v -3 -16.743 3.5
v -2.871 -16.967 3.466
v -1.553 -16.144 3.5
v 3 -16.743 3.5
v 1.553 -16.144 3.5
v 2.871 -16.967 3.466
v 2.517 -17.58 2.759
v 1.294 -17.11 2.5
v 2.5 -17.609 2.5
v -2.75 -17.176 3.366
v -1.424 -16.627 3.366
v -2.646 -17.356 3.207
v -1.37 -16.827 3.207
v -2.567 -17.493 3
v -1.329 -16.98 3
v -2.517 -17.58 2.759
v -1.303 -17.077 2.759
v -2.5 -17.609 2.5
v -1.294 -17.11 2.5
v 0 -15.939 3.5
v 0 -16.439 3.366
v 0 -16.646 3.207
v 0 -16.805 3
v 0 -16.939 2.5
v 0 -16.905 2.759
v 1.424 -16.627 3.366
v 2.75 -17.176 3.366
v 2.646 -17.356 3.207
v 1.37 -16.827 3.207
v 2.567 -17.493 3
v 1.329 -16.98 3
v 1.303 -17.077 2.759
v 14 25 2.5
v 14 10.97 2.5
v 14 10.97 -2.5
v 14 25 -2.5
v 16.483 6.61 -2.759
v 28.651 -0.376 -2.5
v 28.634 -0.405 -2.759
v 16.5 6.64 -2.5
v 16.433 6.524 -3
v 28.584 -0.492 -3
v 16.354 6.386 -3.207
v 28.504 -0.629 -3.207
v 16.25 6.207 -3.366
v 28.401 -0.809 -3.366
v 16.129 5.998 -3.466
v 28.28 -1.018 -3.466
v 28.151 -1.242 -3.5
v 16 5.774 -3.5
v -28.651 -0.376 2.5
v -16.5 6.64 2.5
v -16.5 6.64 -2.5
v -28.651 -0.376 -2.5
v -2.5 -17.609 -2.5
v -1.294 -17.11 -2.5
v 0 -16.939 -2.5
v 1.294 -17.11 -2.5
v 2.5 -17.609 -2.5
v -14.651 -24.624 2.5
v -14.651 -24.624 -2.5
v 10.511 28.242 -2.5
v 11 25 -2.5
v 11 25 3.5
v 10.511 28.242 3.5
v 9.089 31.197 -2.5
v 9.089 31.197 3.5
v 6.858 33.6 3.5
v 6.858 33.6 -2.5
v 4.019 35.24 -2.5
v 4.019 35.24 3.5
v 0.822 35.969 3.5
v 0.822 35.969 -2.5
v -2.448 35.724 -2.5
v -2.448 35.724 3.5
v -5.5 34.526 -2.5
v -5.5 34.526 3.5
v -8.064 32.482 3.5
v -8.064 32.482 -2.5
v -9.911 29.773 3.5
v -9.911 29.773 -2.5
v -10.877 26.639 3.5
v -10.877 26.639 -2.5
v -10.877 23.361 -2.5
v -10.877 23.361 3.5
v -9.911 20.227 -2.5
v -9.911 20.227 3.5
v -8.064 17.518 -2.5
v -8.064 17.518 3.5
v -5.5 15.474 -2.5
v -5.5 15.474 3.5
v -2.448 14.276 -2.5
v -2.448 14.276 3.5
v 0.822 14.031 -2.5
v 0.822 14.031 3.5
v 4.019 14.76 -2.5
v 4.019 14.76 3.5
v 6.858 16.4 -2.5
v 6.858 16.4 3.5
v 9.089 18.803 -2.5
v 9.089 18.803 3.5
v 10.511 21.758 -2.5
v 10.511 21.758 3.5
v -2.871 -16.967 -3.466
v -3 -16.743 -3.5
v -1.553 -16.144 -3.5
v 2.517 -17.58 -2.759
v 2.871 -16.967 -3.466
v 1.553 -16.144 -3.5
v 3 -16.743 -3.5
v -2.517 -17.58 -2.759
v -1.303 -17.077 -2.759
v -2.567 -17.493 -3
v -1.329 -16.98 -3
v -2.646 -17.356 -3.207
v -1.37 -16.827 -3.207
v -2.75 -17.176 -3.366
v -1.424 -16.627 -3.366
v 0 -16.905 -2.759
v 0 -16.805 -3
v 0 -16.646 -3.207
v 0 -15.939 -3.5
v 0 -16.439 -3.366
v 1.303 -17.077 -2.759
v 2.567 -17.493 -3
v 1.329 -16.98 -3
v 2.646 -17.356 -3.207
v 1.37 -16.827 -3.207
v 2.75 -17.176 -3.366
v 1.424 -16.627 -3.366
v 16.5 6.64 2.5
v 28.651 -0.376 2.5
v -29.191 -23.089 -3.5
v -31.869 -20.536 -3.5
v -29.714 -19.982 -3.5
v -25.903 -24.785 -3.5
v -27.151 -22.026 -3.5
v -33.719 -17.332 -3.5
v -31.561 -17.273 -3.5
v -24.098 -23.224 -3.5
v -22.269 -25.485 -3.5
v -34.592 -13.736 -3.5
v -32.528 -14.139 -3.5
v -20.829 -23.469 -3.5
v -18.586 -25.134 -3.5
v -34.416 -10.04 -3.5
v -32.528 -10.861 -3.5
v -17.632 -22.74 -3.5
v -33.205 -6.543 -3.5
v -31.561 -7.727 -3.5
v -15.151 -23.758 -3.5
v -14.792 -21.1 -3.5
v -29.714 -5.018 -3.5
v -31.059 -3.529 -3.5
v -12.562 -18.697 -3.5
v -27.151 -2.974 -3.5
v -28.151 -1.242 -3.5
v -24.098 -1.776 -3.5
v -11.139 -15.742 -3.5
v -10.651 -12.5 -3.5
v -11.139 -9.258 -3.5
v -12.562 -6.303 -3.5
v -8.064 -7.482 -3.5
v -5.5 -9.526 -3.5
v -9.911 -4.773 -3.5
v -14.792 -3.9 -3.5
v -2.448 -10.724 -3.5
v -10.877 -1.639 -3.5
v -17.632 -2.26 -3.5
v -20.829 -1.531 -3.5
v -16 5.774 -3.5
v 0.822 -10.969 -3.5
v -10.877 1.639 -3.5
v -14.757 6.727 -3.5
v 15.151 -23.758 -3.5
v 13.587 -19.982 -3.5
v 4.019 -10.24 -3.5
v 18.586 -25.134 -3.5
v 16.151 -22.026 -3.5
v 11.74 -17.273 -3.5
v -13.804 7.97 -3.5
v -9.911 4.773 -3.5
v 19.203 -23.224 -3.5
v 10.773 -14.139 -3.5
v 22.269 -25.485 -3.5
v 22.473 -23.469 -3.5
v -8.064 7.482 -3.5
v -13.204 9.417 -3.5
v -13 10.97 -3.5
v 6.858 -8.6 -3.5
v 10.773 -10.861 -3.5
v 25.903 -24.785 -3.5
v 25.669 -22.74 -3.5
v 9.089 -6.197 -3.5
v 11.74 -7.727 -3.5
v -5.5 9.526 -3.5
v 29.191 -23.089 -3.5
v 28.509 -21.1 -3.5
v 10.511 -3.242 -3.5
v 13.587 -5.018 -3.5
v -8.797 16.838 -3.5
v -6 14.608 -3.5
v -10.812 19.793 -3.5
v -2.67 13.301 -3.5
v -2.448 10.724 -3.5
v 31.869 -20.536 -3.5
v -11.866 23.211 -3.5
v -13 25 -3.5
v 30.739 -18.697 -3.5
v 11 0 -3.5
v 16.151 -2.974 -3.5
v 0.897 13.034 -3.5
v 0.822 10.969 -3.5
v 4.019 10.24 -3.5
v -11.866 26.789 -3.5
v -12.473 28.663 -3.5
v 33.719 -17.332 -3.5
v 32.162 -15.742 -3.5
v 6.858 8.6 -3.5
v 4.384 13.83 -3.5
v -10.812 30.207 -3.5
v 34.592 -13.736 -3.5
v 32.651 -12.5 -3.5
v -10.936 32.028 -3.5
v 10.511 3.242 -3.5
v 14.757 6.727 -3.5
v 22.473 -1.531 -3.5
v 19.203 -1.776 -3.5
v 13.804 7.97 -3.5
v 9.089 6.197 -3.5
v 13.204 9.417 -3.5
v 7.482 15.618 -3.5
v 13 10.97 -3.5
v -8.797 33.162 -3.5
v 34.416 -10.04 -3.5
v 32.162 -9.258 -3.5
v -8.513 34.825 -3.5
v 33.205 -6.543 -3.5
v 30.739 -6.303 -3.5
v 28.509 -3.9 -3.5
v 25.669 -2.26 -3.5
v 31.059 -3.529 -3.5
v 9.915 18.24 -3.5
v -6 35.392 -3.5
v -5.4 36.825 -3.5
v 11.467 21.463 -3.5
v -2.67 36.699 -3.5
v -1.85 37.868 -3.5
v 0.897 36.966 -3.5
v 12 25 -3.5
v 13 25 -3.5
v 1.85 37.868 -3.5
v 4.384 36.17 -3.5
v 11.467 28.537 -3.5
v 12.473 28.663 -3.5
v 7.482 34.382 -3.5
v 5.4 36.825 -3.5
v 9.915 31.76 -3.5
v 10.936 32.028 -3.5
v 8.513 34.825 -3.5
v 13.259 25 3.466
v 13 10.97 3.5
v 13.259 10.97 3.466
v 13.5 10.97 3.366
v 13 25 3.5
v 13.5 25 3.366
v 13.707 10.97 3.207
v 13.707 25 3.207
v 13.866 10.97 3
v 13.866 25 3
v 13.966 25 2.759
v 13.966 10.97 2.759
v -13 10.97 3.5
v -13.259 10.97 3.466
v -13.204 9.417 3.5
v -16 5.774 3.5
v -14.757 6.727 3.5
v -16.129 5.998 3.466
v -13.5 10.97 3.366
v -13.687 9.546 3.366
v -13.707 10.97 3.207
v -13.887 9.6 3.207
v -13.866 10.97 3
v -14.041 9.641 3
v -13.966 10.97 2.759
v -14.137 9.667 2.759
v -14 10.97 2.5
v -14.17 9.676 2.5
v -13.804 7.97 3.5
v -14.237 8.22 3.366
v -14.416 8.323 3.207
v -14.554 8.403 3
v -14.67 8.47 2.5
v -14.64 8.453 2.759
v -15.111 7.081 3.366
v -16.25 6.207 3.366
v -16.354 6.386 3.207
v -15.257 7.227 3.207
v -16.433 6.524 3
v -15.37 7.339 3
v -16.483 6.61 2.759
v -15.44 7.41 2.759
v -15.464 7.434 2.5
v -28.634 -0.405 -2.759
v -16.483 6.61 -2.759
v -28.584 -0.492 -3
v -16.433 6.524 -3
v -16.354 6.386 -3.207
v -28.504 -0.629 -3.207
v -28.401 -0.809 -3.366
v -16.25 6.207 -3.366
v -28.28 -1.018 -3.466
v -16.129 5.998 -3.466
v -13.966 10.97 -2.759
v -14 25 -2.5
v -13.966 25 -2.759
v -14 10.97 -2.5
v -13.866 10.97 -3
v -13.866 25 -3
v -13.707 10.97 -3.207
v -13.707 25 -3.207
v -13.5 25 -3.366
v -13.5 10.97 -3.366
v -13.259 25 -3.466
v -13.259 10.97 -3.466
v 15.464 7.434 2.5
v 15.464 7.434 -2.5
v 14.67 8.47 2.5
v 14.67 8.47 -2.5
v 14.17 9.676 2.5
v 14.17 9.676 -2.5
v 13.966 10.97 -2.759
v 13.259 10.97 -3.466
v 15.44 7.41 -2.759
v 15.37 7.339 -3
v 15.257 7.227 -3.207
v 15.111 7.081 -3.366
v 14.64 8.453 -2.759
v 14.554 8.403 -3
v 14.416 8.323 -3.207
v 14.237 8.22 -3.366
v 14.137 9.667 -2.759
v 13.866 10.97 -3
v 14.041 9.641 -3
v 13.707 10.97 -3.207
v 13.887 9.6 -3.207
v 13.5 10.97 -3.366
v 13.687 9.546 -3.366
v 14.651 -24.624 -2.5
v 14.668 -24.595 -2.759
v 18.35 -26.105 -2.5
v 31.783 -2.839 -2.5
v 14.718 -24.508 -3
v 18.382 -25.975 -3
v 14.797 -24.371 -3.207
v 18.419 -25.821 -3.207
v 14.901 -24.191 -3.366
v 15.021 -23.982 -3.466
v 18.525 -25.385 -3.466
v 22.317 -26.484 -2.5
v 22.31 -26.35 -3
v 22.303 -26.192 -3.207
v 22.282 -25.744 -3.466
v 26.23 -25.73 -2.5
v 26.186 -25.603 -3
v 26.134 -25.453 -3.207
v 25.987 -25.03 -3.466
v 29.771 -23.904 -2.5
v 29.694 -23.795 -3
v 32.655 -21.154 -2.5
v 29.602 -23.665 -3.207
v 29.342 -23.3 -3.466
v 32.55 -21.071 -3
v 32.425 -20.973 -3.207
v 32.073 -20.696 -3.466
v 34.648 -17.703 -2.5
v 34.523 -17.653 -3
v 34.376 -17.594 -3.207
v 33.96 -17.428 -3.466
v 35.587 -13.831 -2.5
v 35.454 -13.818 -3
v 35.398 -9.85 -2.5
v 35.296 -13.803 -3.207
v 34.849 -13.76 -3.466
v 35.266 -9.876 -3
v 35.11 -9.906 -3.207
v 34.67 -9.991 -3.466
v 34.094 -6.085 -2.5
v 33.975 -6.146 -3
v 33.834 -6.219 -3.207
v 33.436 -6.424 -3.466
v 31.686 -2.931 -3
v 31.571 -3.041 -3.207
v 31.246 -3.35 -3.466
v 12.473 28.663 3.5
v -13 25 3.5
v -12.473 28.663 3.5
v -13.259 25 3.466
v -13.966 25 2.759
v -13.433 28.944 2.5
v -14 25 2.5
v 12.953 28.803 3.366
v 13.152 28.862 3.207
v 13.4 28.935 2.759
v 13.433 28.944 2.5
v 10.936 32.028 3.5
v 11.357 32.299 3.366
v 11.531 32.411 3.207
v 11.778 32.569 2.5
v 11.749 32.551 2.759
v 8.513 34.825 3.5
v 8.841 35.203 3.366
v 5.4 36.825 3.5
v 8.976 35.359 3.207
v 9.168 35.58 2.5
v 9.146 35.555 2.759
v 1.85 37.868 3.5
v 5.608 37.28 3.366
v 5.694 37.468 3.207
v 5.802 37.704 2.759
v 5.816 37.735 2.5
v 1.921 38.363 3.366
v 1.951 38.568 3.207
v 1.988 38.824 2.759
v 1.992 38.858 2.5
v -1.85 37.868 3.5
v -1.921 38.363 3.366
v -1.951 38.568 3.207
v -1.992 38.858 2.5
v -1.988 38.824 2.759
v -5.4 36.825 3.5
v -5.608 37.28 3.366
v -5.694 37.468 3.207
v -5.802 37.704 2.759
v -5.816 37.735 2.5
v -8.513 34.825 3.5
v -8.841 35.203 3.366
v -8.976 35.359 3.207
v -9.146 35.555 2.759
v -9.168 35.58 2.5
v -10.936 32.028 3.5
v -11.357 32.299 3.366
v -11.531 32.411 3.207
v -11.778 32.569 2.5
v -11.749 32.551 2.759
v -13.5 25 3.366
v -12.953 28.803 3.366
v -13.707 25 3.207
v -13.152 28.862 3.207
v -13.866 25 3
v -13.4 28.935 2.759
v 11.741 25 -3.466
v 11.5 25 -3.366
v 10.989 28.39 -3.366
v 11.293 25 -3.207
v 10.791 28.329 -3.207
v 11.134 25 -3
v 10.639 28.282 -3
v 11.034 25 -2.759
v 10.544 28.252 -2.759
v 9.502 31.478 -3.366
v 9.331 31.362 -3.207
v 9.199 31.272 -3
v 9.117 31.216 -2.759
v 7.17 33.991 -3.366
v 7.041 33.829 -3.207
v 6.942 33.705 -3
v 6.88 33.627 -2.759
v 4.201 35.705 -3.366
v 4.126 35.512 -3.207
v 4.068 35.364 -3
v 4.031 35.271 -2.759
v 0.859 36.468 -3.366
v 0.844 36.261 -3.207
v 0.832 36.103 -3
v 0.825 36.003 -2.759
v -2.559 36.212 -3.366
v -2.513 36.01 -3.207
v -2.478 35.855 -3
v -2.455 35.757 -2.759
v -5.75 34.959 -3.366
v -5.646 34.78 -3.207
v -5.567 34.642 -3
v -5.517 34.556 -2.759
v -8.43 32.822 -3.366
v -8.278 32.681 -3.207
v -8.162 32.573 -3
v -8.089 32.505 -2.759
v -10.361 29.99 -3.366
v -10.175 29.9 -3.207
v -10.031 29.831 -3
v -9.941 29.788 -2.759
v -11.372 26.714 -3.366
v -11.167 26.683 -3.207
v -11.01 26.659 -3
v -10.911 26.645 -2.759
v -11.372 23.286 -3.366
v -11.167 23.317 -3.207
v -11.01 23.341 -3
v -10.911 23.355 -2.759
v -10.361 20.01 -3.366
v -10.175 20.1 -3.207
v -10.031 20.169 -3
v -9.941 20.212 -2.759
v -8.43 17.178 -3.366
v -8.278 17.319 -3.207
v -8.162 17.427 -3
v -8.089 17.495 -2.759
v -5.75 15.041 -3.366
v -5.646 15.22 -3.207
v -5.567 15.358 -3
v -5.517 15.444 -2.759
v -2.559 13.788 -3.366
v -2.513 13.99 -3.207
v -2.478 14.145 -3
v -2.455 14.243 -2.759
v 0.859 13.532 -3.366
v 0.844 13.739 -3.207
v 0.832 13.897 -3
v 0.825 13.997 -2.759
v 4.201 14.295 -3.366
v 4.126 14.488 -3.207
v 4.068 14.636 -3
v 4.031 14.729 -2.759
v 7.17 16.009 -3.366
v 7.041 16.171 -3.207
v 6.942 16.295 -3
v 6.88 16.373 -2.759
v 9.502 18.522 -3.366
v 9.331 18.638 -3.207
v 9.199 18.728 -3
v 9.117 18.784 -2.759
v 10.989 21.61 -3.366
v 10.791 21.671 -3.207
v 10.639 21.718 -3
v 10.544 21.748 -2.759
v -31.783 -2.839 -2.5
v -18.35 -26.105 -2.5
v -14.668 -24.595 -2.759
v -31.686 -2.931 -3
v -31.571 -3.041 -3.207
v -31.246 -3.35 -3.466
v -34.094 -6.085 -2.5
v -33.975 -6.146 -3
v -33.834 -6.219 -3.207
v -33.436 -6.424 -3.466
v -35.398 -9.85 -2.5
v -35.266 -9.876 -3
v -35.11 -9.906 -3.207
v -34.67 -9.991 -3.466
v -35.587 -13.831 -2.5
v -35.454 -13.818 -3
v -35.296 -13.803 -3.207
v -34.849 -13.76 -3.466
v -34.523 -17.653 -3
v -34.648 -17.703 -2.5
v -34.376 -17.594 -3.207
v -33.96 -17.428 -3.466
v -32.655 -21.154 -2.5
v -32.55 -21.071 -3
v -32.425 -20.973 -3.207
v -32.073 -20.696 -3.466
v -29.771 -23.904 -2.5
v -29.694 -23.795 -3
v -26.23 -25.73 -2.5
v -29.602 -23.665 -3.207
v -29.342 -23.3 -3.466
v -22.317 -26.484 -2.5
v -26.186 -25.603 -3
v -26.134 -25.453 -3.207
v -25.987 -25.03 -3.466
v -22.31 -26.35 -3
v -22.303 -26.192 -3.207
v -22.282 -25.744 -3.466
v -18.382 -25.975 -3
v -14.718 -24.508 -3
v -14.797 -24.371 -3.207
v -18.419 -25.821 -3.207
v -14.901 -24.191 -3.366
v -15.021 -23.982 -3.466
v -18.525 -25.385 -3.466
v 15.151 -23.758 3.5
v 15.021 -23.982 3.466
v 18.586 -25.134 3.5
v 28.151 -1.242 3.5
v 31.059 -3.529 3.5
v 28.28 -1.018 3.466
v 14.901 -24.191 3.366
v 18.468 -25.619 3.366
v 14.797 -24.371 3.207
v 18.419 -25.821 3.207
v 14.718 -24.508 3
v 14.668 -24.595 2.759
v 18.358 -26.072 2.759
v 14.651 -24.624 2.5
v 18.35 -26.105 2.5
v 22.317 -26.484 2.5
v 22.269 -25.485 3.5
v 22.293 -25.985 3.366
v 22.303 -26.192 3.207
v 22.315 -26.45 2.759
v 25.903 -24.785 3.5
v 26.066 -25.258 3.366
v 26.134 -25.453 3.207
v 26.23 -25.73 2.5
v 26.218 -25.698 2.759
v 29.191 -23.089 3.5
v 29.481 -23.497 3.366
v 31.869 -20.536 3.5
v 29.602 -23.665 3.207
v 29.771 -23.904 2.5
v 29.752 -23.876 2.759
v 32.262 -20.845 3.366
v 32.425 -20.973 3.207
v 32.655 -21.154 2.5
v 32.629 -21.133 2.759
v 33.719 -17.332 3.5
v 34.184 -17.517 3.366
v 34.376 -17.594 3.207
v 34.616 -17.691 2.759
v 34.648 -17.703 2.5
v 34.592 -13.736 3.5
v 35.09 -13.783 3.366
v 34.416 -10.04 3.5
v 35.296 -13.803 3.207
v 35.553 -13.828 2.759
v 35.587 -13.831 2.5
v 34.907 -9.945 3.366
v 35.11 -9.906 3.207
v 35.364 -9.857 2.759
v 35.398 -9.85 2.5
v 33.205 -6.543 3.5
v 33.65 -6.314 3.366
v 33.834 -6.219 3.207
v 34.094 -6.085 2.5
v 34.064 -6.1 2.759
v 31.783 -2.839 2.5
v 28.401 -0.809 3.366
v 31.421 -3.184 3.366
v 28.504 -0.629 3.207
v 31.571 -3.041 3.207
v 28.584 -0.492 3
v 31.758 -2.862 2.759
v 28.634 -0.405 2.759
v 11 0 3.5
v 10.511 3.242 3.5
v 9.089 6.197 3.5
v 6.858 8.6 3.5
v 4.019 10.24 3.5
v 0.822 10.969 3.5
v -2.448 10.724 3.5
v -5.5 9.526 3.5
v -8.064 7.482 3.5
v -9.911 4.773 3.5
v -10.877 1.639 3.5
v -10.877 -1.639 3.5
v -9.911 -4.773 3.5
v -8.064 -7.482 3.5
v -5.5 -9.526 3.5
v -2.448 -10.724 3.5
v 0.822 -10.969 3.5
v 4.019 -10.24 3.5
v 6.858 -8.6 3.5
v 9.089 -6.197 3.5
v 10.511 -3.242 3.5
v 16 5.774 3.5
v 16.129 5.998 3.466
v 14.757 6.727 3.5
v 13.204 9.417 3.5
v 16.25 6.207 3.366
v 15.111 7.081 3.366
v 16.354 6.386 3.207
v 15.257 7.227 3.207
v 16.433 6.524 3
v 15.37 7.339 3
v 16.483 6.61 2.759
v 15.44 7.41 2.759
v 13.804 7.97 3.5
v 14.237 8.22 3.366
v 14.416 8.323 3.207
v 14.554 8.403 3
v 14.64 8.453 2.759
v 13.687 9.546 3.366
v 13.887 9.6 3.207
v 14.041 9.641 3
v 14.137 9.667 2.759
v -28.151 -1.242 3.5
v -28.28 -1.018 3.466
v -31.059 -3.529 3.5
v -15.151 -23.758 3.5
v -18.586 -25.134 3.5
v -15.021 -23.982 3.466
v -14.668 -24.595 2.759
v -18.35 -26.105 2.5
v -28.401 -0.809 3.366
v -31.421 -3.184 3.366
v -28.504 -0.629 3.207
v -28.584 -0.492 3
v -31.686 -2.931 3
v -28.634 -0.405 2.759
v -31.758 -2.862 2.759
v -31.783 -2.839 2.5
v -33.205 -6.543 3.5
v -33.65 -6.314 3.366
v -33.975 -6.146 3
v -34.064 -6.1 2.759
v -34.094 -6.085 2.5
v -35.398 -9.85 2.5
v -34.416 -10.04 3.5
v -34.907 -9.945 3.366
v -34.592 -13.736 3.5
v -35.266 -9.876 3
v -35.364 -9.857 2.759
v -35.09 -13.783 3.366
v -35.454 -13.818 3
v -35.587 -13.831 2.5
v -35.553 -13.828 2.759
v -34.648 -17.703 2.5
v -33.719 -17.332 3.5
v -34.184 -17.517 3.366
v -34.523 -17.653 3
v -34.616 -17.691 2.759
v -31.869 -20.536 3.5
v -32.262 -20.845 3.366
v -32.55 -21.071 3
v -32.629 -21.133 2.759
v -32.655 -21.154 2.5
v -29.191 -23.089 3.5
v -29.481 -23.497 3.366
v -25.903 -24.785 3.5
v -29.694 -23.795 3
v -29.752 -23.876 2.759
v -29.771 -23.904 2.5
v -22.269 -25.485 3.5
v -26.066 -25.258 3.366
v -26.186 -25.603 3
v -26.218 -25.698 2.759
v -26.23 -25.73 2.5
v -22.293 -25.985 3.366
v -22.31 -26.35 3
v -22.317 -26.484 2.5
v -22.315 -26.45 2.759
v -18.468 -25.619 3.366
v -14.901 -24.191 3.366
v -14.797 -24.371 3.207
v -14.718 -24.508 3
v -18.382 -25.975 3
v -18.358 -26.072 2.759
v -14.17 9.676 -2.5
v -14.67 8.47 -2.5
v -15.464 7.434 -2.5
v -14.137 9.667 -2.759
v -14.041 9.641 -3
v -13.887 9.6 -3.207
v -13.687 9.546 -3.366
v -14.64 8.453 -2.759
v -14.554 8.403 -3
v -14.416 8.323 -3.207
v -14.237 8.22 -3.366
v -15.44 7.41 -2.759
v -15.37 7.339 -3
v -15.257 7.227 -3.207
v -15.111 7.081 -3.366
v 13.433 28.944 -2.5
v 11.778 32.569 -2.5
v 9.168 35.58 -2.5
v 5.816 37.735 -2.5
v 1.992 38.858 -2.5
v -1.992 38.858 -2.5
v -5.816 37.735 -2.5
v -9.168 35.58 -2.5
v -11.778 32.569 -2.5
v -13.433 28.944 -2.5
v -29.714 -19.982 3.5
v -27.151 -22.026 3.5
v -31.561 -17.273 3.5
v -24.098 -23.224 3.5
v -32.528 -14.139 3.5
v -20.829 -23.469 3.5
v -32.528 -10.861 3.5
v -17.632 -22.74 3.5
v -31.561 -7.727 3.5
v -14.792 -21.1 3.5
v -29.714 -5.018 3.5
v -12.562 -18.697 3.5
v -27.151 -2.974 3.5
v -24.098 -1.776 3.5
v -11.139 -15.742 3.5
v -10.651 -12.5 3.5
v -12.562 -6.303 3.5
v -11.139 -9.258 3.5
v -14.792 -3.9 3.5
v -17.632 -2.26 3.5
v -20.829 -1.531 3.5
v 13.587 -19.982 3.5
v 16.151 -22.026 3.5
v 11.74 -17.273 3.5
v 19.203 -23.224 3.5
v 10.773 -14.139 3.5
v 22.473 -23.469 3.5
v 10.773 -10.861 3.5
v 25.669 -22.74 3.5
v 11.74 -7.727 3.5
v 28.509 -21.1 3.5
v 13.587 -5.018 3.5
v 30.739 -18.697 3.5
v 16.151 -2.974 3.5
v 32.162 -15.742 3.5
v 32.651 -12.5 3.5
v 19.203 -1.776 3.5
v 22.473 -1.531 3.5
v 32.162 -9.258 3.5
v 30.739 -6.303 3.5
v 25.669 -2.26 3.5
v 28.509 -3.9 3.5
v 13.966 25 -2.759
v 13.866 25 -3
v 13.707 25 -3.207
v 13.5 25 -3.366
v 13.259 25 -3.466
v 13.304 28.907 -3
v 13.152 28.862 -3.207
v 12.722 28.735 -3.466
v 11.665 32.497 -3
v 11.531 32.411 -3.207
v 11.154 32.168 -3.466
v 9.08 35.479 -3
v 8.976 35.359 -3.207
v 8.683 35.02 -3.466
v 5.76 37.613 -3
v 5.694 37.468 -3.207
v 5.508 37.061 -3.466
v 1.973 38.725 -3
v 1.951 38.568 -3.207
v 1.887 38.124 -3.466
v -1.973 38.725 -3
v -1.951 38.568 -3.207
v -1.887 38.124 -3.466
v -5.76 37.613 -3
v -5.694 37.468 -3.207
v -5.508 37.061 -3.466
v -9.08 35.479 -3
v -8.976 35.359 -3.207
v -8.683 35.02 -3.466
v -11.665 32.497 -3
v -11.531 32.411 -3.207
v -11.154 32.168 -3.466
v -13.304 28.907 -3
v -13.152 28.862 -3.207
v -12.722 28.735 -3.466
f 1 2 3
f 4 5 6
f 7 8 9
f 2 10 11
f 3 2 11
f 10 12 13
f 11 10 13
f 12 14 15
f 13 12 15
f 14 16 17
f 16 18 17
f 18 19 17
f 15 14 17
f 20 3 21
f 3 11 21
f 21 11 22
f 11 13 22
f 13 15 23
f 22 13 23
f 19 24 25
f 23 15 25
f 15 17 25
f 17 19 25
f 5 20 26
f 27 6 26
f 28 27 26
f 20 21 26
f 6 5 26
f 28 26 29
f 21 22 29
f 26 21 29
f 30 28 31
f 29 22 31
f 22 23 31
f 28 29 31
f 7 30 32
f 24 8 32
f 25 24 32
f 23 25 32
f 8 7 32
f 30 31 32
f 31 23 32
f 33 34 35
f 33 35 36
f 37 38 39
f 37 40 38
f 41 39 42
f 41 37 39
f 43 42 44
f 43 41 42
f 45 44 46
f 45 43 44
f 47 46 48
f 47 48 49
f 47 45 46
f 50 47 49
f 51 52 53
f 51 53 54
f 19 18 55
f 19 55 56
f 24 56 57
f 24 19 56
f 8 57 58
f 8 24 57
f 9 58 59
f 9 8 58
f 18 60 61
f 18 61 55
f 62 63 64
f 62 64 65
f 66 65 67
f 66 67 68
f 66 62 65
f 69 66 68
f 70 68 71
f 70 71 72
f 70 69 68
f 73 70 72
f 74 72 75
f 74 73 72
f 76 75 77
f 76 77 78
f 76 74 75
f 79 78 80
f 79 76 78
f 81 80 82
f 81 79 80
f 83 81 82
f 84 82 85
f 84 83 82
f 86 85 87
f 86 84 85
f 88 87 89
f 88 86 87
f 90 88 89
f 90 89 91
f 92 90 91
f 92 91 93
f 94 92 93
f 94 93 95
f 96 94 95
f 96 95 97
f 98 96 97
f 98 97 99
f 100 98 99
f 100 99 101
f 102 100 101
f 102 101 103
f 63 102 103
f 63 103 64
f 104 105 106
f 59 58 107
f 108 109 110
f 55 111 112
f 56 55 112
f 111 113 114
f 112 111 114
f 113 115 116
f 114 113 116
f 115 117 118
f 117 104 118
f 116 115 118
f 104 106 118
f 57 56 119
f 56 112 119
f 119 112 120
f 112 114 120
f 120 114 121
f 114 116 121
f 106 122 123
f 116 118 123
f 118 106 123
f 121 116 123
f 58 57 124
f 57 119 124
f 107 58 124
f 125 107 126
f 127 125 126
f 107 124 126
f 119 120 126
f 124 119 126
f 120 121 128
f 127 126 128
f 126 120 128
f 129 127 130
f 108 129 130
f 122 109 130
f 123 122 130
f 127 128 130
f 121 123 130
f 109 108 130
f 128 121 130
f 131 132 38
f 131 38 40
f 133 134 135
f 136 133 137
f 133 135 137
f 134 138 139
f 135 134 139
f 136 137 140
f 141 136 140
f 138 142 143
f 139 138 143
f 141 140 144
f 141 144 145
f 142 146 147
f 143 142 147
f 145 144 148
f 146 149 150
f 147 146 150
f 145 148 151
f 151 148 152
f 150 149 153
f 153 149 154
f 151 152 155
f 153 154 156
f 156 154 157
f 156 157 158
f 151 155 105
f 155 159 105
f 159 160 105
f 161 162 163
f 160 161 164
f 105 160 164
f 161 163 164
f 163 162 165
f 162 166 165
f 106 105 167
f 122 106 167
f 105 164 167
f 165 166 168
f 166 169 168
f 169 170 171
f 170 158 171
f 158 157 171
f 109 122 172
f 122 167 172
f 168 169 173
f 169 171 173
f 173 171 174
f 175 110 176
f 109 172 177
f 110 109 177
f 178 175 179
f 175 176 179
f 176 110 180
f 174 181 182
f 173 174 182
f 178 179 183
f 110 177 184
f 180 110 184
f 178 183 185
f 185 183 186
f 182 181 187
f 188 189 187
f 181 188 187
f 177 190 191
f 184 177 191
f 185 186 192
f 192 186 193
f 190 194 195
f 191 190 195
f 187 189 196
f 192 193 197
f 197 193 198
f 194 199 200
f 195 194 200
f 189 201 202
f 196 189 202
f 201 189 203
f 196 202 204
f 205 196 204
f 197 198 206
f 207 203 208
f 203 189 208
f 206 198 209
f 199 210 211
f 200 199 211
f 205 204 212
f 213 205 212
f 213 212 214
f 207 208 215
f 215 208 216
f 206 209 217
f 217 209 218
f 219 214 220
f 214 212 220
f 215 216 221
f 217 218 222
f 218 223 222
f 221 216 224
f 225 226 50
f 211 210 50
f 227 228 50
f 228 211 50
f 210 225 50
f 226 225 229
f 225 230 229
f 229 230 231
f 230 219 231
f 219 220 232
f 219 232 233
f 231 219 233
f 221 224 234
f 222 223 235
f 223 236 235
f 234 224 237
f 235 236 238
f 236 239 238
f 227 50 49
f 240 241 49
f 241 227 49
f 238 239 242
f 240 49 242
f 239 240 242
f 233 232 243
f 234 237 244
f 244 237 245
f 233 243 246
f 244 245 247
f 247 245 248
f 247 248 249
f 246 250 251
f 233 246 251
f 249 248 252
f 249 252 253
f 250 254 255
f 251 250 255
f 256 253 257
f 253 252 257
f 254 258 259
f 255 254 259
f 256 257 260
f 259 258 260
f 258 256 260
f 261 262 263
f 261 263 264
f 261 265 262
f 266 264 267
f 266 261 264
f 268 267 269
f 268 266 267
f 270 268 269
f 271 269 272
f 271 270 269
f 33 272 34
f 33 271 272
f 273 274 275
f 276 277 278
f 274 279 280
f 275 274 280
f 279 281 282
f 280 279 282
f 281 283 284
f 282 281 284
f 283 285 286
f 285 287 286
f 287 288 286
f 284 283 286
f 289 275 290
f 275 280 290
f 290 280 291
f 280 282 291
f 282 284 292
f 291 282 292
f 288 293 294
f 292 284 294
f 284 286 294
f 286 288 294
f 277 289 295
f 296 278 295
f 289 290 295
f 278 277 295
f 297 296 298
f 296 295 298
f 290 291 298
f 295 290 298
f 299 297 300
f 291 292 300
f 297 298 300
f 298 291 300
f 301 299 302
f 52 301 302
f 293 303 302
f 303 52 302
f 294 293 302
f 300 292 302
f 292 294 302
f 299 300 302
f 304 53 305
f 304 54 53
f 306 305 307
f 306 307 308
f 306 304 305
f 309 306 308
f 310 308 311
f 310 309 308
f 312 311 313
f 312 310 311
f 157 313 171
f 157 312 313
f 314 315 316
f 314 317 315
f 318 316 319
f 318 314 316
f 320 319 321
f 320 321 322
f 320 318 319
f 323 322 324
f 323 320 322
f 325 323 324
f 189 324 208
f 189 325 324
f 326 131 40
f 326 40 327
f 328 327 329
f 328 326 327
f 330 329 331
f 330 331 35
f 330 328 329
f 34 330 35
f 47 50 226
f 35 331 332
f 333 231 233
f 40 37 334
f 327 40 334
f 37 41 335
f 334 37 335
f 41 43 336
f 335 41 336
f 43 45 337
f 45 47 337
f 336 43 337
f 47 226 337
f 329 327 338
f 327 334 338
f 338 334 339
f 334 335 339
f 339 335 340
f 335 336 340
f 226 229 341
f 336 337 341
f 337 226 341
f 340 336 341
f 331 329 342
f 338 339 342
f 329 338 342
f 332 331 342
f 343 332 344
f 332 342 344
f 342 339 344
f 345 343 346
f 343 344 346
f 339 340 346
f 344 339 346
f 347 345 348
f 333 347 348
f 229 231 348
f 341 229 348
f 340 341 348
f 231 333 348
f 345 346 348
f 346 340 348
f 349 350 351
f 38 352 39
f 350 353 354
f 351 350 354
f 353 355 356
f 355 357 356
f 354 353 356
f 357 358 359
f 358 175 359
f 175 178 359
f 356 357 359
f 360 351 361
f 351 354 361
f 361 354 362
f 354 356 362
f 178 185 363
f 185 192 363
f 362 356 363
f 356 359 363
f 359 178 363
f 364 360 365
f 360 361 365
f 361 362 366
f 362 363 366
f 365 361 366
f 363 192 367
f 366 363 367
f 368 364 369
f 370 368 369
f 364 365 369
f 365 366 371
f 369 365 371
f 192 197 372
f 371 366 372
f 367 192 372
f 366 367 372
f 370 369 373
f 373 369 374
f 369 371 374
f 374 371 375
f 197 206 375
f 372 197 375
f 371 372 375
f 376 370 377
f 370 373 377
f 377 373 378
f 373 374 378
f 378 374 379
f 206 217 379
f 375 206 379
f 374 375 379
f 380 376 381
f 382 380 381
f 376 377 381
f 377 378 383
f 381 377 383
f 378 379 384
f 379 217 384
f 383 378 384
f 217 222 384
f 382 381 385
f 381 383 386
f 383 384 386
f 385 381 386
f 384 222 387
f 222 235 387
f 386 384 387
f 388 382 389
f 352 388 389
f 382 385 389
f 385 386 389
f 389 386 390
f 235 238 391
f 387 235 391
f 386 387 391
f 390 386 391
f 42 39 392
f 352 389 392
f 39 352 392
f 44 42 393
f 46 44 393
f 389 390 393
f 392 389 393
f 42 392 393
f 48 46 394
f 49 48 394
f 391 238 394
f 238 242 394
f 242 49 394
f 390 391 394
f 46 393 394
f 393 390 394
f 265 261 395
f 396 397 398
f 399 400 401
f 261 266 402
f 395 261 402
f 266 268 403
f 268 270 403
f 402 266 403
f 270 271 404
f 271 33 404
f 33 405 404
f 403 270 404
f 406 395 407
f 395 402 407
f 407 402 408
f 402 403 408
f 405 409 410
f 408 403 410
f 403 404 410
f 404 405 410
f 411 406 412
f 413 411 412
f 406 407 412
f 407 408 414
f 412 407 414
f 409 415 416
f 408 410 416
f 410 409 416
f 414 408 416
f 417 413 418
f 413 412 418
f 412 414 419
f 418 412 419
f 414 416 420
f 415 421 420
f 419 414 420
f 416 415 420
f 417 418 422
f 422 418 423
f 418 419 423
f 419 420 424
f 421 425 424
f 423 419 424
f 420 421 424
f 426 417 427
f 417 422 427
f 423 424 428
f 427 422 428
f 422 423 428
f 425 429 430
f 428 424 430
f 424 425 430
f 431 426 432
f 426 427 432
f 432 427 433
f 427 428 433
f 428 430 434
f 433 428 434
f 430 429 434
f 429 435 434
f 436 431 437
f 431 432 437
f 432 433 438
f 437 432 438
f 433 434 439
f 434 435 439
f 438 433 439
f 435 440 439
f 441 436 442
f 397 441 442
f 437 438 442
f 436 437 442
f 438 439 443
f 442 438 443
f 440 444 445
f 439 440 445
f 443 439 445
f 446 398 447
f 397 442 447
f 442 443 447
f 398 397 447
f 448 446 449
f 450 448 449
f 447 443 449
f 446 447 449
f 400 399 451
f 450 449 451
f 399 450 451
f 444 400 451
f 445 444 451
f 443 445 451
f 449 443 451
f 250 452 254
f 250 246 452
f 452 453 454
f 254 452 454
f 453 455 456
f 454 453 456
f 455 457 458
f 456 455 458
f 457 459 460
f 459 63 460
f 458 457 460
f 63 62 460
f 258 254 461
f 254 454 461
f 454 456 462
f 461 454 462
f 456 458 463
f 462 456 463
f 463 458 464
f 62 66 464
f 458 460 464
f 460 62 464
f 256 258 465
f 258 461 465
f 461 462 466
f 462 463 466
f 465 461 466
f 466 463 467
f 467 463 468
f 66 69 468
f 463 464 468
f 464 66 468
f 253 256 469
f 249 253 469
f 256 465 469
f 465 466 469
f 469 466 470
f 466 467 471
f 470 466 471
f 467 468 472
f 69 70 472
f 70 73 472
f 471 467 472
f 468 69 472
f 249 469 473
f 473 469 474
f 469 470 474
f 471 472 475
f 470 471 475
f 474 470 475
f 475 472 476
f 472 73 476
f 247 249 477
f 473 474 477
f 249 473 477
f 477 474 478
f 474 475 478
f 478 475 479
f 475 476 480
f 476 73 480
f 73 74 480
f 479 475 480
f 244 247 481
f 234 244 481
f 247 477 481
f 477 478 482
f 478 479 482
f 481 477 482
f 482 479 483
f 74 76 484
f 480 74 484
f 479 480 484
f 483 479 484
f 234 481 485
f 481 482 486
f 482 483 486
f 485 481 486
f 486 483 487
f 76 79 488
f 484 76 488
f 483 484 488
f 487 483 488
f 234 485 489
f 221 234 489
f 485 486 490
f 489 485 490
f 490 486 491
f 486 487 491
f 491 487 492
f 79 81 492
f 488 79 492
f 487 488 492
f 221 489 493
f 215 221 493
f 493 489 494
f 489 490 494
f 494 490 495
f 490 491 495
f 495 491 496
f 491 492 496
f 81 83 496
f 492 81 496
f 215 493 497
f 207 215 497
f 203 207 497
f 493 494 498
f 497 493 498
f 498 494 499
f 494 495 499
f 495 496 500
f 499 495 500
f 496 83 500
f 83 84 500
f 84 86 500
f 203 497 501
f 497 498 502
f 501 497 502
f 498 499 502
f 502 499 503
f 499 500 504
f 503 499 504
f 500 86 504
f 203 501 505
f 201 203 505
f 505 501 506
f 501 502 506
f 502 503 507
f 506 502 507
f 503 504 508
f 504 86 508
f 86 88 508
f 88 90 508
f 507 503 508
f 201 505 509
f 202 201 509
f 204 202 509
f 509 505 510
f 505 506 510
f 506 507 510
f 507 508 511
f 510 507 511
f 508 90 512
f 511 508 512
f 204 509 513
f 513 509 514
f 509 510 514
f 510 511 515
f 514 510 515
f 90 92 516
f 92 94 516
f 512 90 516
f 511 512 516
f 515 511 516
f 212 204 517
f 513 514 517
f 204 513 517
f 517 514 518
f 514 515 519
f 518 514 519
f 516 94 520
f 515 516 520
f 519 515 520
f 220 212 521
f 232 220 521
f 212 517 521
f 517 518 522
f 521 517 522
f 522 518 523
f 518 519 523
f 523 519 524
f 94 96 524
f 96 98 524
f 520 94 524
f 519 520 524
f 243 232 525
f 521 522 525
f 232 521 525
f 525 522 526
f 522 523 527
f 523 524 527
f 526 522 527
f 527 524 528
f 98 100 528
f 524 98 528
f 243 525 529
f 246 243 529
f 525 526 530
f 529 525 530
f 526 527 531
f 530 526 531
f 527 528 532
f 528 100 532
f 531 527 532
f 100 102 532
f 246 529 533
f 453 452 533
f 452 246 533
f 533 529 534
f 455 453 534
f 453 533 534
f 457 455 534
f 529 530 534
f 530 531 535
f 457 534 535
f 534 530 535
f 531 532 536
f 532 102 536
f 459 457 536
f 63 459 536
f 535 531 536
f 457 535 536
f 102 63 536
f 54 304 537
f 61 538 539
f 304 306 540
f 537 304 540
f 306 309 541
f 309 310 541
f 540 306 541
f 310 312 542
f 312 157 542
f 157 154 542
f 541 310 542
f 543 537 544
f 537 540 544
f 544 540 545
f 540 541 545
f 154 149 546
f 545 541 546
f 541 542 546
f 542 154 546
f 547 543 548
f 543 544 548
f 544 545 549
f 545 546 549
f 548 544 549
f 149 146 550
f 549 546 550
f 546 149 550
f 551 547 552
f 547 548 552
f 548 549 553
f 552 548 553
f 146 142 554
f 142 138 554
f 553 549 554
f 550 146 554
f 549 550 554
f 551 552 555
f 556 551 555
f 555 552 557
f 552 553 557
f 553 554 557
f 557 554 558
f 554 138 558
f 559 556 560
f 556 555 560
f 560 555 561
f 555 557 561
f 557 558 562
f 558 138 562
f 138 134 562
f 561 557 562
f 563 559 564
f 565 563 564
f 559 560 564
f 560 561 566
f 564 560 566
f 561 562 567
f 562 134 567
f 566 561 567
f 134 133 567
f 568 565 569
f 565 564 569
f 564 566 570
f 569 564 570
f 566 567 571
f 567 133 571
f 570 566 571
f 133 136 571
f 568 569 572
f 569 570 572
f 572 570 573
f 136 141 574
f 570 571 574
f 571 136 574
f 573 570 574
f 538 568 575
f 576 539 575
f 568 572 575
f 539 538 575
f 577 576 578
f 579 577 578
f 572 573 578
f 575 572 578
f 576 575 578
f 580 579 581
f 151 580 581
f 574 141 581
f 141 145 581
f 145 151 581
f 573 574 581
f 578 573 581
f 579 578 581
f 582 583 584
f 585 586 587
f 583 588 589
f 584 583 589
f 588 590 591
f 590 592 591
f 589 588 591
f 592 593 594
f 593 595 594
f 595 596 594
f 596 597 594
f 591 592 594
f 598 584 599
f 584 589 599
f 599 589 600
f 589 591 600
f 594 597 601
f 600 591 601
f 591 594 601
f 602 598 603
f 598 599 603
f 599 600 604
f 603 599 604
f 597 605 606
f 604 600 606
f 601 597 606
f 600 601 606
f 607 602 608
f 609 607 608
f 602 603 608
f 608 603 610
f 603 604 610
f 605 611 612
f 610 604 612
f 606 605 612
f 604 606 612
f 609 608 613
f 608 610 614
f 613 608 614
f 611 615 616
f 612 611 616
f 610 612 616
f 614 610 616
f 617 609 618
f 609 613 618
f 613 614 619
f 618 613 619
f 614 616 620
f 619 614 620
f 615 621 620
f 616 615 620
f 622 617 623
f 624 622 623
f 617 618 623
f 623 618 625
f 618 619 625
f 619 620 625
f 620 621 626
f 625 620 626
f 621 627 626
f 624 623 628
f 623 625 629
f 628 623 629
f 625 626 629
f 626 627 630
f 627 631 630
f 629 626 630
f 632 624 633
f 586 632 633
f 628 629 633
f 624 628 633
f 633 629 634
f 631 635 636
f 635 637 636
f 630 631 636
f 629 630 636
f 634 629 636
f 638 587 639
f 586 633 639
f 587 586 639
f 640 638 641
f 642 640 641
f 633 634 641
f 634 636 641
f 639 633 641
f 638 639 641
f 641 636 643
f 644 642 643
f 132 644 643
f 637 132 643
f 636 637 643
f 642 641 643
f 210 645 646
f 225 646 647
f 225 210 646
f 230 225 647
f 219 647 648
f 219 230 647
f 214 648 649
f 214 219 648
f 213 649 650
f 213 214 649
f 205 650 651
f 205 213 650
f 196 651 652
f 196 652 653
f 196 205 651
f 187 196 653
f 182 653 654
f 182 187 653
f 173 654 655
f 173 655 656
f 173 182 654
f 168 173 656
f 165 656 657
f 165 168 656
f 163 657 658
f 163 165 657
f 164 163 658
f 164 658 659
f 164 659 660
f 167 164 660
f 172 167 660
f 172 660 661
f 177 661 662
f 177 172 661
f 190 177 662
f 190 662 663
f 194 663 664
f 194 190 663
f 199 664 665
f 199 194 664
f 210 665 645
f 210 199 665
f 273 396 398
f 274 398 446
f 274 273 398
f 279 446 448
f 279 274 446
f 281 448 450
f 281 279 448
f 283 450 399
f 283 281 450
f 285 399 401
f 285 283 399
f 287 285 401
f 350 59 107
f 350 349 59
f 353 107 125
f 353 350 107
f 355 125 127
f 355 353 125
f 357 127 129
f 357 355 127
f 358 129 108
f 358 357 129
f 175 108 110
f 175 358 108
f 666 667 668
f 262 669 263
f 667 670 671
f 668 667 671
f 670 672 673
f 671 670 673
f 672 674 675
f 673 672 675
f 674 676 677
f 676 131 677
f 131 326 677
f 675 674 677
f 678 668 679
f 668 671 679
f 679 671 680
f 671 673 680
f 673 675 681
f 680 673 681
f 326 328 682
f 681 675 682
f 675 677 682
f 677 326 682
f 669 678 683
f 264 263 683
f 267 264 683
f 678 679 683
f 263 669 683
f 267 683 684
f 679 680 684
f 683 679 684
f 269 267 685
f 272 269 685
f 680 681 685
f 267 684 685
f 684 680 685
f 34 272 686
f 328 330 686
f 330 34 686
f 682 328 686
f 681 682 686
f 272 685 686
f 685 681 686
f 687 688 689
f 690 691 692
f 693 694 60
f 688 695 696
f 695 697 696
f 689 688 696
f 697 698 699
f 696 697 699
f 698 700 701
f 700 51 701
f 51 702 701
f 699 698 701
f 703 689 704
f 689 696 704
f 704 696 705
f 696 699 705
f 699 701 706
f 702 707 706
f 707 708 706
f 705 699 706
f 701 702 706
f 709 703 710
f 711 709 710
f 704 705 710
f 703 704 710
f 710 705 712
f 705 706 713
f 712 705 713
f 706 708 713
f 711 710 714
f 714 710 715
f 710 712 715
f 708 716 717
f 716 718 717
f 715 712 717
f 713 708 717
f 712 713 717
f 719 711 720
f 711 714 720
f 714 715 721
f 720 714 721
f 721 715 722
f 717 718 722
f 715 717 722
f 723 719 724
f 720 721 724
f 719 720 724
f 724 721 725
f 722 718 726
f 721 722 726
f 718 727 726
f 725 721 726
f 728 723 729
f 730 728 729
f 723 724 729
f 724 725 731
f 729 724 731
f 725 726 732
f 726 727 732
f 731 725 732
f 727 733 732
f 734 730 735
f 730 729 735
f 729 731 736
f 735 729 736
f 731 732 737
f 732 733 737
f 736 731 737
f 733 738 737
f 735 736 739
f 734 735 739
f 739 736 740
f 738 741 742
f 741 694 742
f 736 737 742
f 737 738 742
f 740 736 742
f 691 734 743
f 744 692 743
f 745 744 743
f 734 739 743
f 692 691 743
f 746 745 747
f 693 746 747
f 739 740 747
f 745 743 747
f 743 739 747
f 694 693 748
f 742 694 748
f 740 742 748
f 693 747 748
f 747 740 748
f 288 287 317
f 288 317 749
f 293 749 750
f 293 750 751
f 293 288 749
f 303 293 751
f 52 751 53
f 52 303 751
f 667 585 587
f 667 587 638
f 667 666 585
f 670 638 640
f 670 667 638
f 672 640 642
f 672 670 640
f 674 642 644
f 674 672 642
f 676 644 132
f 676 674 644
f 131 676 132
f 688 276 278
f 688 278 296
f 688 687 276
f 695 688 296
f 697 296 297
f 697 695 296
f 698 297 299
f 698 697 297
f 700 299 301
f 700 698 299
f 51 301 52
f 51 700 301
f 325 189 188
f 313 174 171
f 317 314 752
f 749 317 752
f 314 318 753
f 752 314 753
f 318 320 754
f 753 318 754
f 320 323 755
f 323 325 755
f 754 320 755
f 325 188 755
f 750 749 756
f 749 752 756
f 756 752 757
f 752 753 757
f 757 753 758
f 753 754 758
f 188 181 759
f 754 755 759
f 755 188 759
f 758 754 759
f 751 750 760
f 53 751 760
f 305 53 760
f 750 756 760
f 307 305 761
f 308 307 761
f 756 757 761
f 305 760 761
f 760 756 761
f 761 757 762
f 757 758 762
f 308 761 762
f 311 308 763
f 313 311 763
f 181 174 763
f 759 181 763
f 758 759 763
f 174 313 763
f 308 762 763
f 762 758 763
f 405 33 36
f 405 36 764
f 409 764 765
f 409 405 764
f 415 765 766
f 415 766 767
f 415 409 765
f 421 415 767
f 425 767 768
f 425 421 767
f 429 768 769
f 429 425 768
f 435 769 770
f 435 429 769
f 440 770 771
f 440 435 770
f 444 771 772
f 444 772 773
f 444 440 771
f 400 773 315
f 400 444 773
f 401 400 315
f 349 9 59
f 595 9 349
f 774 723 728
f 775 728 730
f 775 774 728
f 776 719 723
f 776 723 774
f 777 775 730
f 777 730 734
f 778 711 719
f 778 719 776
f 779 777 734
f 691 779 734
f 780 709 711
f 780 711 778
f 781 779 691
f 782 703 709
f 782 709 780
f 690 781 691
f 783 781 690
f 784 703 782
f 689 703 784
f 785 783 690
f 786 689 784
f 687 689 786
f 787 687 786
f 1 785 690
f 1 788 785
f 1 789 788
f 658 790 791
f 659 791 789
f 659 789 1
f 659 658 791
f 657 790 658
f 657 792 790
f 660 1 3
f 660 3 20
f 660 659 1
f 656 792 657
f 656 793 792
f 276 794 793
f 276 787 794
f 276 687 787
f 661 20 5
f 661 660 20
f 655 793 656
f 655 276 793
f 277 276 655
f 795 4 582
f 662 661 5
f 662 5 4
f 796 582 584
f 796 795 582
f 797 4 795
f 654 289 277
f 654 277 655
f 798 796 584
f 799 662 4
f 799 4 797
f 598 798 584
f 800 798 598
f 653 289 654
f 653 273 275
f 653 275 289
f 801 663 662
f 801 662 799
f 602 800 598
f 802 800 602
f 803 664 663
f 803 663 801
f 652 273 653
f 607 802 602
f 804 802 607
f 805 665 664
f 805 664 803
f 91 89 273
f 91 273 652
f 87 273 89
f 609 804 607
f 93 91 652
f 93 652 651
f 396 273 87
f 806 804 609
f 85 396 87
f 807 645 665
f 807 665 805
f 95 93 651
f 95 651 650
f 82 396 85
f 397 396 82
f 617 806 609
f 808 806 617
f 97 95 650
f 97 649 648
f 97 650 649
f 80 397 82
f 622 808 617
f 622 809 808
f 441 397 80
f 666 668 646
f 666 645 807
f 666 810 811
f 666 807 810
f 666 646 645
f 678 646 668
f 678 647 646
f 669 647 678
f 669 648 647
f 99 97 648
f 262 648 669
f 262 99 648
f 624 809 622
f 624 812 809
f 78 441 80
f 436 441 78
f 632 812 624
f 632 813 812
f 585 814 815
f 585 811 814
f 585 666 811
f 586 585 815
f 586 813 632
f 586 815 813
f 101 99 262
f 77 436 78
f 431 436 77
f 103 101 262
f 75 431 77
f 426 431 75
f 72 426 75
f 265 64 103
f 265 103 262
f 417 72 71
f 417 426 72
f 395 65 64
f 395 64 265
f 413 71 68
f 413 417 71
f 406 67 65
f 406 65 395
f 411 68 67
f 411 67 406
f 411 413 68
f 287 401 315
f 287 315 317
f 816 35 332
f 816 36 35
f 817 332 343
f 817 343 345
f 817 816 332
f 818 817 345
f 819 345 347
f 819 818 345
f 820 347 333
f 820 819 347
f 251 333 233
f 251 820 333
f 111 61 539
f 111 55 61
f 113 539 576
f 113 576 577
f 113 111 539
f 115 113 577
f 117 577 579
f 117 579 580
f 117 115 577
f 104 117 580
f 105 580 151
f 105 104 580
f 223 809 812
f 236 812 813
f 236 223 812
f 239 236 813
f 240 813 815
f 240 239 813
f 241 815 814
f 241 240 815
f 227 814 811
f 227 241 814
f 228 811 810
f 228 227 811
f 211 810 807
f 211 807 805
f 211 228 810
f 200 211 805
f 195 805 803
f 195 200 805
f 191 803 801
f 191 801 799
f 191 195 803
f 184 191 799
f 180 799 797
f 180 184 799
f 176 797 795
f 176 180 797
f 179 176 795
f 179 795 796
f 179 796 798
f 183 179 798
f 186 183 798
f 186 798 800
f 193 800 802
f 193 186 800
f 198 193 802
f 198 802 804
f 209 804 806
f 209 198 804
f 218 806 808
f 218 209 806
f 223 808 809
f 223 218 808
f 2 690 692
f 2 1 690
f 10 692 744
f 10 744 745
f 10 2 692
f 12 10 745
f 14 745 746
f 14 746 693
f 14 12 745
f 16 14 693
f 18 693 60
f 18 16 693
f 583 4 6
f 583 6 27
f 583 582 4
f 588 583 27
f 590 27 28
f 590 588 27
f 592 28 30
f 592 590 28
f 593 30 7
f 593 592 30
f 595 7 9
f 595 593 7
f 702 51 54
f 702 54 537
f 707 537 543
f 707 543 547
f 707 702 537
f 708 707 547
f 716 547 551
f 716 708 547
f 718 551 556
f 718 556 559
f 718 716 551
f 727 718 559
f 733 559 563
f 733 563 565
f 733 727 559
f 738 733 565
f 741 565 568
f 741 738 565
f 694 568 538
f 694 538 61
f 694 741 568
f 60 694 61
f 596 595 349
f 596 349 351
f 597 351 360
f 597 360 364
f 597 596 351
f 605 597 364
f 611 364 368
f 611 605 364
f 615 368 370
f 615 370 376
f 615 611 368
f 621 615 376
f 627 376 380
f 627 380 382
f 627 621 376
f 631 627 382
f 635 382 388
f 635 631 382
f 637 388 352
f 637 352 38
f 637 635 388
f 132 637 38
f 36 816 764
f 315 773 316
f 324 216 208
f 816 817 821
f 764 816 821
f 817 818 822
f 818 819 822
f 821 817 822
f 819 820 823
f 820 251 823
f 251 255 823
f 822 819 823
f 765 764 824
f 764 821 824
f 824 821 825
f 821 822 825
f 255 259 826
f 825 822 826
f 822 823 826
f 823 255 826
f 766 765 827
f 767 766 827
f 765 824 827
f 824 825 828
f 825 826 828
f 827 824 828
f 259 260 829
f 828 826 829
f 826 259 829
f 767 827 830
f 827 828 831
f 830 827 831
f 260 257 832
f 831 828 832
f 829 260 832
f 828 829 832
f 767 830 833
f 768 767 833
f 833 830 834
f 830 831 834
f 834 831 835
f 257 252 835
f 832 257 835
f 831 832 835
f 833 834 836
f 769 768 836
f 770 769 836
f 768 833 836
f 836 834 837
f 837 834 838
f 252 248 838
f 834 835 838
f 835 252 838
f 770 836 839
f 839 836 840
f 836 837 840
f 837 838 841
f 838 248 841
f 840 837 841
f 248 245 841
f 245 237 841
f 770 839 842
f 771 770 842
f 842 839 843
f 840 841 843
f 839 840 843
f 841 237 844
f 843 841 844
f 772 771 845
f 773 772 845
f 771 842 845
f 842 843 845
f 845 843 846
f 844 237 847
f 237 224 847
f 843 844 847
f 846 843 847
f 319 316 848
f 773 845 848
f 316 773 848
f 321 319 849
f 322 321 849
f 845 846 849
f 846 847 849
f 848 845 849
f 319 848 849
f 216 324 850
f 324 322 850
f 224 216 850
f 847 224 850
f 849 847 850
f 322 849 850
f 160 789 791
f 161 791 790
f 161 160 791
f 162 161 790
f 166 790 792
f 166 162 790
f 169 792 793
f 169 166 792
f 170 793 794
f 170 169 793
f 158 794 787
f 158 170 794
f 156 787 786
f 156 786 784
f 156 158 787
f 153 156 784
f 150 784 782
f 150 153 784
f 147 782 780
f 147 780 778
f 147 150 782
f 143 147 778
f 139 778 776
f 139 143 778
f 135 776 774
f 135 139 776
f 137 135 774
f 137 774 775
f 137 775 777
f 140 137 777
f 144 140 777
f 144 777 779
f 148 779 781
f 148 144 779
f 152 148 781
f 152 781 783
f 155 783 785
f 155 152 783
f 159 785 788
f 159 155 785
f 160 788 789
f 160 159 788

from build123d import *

# Parameters (mm, degrees)
F0_R     = 11
F1_DEPTH = 3.5
F2_R     = 1
F3_R     = 1


# Not quite as in the source:
# - a feature names something its author has since deleted; it is built from what else it names


with BuildPart() as f1:
    # F0 (on Top) → F1 (new body, symmetric)
    with BuildSketch(Plane.XY):
        with BuildLine():
            ThreePointArc((-28.6506350946, -0.375644347), (-33.7749907476, -19.5), (-14.6506350946, -24.624355653))
            Line((-14.6506350946, -24.624355653), (-2.5, -17.6091832103))
            ThreePointArc((-2.5, -17.6091832103), (0, -16.9393102292), (2.5, -17.6091832103))
            Line((2.5, -17.6091832103), (14.6506350946, -24.624355653))
            ThreePointArc((14.6506350946, -24.624355653), (33.7749907476, -19.5), (28.6506350946, -0.375644347))
            Line((28.6506350946, -0.375644347), (16.5, 6.6395280957))
            ThreePointArc((16.5, 6.6395280957), (14.6698729811, 8.4696551146), (14, 10.9696551146))
            Line((14, 10.9696551146), (14, 25))
            ThreePointArc((14, 25), (0, 39), (-14, 25))
            Line((-14, 25), (-14, 10.9696551146))
            ThreePointArc((-14, 10.9696551146), (-14.6698729811, 8.4696551146), (-16.5, 6.6395280957))
            Line((-16.5, 6.6395280957), (-28.6506350946, -0.375644347))
        make_face()
        with Locations((-21.6506350946, -12.5)):
            Circle(F0_R, mode=Mode.SUBTRACT)
        with Locations((21.6506350946, -12.5)):
            Circle(F0_R, mode=Mode.SUBTRACT)
        Circle(F0_R, mode=Mode.SUBTRACT)
        with Locations((0, 25)):
            Circle(F0_R, mode=Mode.SUBTRACT)
    extrude(amount=F1_DEPTH, both=True)

    # F2
    f2_edges = [f1.edges().sort_by_distance(p)[0] for p in [
        (-8.575318, -21.116769, 3.5),
        (-33.774991, -19.5, 3.5),
        (-22.575318, 3.131942, 3.5),
    ]]
    fillet(f2_edges, radius=F2_R)

    # F3
    f3_edges = [f1.edges().sort_by_distance(p)[0] for p in [
        (-8.575318, -21.116769, -3.5),
        (-33.774991, -19.5, -3.5),
        (-22.575318, 3.131942, -3.5),
        (-11, 25, -3.5),
    ]]
    fillet(f3_edges, radius=F3_R)


solid = f1.part
